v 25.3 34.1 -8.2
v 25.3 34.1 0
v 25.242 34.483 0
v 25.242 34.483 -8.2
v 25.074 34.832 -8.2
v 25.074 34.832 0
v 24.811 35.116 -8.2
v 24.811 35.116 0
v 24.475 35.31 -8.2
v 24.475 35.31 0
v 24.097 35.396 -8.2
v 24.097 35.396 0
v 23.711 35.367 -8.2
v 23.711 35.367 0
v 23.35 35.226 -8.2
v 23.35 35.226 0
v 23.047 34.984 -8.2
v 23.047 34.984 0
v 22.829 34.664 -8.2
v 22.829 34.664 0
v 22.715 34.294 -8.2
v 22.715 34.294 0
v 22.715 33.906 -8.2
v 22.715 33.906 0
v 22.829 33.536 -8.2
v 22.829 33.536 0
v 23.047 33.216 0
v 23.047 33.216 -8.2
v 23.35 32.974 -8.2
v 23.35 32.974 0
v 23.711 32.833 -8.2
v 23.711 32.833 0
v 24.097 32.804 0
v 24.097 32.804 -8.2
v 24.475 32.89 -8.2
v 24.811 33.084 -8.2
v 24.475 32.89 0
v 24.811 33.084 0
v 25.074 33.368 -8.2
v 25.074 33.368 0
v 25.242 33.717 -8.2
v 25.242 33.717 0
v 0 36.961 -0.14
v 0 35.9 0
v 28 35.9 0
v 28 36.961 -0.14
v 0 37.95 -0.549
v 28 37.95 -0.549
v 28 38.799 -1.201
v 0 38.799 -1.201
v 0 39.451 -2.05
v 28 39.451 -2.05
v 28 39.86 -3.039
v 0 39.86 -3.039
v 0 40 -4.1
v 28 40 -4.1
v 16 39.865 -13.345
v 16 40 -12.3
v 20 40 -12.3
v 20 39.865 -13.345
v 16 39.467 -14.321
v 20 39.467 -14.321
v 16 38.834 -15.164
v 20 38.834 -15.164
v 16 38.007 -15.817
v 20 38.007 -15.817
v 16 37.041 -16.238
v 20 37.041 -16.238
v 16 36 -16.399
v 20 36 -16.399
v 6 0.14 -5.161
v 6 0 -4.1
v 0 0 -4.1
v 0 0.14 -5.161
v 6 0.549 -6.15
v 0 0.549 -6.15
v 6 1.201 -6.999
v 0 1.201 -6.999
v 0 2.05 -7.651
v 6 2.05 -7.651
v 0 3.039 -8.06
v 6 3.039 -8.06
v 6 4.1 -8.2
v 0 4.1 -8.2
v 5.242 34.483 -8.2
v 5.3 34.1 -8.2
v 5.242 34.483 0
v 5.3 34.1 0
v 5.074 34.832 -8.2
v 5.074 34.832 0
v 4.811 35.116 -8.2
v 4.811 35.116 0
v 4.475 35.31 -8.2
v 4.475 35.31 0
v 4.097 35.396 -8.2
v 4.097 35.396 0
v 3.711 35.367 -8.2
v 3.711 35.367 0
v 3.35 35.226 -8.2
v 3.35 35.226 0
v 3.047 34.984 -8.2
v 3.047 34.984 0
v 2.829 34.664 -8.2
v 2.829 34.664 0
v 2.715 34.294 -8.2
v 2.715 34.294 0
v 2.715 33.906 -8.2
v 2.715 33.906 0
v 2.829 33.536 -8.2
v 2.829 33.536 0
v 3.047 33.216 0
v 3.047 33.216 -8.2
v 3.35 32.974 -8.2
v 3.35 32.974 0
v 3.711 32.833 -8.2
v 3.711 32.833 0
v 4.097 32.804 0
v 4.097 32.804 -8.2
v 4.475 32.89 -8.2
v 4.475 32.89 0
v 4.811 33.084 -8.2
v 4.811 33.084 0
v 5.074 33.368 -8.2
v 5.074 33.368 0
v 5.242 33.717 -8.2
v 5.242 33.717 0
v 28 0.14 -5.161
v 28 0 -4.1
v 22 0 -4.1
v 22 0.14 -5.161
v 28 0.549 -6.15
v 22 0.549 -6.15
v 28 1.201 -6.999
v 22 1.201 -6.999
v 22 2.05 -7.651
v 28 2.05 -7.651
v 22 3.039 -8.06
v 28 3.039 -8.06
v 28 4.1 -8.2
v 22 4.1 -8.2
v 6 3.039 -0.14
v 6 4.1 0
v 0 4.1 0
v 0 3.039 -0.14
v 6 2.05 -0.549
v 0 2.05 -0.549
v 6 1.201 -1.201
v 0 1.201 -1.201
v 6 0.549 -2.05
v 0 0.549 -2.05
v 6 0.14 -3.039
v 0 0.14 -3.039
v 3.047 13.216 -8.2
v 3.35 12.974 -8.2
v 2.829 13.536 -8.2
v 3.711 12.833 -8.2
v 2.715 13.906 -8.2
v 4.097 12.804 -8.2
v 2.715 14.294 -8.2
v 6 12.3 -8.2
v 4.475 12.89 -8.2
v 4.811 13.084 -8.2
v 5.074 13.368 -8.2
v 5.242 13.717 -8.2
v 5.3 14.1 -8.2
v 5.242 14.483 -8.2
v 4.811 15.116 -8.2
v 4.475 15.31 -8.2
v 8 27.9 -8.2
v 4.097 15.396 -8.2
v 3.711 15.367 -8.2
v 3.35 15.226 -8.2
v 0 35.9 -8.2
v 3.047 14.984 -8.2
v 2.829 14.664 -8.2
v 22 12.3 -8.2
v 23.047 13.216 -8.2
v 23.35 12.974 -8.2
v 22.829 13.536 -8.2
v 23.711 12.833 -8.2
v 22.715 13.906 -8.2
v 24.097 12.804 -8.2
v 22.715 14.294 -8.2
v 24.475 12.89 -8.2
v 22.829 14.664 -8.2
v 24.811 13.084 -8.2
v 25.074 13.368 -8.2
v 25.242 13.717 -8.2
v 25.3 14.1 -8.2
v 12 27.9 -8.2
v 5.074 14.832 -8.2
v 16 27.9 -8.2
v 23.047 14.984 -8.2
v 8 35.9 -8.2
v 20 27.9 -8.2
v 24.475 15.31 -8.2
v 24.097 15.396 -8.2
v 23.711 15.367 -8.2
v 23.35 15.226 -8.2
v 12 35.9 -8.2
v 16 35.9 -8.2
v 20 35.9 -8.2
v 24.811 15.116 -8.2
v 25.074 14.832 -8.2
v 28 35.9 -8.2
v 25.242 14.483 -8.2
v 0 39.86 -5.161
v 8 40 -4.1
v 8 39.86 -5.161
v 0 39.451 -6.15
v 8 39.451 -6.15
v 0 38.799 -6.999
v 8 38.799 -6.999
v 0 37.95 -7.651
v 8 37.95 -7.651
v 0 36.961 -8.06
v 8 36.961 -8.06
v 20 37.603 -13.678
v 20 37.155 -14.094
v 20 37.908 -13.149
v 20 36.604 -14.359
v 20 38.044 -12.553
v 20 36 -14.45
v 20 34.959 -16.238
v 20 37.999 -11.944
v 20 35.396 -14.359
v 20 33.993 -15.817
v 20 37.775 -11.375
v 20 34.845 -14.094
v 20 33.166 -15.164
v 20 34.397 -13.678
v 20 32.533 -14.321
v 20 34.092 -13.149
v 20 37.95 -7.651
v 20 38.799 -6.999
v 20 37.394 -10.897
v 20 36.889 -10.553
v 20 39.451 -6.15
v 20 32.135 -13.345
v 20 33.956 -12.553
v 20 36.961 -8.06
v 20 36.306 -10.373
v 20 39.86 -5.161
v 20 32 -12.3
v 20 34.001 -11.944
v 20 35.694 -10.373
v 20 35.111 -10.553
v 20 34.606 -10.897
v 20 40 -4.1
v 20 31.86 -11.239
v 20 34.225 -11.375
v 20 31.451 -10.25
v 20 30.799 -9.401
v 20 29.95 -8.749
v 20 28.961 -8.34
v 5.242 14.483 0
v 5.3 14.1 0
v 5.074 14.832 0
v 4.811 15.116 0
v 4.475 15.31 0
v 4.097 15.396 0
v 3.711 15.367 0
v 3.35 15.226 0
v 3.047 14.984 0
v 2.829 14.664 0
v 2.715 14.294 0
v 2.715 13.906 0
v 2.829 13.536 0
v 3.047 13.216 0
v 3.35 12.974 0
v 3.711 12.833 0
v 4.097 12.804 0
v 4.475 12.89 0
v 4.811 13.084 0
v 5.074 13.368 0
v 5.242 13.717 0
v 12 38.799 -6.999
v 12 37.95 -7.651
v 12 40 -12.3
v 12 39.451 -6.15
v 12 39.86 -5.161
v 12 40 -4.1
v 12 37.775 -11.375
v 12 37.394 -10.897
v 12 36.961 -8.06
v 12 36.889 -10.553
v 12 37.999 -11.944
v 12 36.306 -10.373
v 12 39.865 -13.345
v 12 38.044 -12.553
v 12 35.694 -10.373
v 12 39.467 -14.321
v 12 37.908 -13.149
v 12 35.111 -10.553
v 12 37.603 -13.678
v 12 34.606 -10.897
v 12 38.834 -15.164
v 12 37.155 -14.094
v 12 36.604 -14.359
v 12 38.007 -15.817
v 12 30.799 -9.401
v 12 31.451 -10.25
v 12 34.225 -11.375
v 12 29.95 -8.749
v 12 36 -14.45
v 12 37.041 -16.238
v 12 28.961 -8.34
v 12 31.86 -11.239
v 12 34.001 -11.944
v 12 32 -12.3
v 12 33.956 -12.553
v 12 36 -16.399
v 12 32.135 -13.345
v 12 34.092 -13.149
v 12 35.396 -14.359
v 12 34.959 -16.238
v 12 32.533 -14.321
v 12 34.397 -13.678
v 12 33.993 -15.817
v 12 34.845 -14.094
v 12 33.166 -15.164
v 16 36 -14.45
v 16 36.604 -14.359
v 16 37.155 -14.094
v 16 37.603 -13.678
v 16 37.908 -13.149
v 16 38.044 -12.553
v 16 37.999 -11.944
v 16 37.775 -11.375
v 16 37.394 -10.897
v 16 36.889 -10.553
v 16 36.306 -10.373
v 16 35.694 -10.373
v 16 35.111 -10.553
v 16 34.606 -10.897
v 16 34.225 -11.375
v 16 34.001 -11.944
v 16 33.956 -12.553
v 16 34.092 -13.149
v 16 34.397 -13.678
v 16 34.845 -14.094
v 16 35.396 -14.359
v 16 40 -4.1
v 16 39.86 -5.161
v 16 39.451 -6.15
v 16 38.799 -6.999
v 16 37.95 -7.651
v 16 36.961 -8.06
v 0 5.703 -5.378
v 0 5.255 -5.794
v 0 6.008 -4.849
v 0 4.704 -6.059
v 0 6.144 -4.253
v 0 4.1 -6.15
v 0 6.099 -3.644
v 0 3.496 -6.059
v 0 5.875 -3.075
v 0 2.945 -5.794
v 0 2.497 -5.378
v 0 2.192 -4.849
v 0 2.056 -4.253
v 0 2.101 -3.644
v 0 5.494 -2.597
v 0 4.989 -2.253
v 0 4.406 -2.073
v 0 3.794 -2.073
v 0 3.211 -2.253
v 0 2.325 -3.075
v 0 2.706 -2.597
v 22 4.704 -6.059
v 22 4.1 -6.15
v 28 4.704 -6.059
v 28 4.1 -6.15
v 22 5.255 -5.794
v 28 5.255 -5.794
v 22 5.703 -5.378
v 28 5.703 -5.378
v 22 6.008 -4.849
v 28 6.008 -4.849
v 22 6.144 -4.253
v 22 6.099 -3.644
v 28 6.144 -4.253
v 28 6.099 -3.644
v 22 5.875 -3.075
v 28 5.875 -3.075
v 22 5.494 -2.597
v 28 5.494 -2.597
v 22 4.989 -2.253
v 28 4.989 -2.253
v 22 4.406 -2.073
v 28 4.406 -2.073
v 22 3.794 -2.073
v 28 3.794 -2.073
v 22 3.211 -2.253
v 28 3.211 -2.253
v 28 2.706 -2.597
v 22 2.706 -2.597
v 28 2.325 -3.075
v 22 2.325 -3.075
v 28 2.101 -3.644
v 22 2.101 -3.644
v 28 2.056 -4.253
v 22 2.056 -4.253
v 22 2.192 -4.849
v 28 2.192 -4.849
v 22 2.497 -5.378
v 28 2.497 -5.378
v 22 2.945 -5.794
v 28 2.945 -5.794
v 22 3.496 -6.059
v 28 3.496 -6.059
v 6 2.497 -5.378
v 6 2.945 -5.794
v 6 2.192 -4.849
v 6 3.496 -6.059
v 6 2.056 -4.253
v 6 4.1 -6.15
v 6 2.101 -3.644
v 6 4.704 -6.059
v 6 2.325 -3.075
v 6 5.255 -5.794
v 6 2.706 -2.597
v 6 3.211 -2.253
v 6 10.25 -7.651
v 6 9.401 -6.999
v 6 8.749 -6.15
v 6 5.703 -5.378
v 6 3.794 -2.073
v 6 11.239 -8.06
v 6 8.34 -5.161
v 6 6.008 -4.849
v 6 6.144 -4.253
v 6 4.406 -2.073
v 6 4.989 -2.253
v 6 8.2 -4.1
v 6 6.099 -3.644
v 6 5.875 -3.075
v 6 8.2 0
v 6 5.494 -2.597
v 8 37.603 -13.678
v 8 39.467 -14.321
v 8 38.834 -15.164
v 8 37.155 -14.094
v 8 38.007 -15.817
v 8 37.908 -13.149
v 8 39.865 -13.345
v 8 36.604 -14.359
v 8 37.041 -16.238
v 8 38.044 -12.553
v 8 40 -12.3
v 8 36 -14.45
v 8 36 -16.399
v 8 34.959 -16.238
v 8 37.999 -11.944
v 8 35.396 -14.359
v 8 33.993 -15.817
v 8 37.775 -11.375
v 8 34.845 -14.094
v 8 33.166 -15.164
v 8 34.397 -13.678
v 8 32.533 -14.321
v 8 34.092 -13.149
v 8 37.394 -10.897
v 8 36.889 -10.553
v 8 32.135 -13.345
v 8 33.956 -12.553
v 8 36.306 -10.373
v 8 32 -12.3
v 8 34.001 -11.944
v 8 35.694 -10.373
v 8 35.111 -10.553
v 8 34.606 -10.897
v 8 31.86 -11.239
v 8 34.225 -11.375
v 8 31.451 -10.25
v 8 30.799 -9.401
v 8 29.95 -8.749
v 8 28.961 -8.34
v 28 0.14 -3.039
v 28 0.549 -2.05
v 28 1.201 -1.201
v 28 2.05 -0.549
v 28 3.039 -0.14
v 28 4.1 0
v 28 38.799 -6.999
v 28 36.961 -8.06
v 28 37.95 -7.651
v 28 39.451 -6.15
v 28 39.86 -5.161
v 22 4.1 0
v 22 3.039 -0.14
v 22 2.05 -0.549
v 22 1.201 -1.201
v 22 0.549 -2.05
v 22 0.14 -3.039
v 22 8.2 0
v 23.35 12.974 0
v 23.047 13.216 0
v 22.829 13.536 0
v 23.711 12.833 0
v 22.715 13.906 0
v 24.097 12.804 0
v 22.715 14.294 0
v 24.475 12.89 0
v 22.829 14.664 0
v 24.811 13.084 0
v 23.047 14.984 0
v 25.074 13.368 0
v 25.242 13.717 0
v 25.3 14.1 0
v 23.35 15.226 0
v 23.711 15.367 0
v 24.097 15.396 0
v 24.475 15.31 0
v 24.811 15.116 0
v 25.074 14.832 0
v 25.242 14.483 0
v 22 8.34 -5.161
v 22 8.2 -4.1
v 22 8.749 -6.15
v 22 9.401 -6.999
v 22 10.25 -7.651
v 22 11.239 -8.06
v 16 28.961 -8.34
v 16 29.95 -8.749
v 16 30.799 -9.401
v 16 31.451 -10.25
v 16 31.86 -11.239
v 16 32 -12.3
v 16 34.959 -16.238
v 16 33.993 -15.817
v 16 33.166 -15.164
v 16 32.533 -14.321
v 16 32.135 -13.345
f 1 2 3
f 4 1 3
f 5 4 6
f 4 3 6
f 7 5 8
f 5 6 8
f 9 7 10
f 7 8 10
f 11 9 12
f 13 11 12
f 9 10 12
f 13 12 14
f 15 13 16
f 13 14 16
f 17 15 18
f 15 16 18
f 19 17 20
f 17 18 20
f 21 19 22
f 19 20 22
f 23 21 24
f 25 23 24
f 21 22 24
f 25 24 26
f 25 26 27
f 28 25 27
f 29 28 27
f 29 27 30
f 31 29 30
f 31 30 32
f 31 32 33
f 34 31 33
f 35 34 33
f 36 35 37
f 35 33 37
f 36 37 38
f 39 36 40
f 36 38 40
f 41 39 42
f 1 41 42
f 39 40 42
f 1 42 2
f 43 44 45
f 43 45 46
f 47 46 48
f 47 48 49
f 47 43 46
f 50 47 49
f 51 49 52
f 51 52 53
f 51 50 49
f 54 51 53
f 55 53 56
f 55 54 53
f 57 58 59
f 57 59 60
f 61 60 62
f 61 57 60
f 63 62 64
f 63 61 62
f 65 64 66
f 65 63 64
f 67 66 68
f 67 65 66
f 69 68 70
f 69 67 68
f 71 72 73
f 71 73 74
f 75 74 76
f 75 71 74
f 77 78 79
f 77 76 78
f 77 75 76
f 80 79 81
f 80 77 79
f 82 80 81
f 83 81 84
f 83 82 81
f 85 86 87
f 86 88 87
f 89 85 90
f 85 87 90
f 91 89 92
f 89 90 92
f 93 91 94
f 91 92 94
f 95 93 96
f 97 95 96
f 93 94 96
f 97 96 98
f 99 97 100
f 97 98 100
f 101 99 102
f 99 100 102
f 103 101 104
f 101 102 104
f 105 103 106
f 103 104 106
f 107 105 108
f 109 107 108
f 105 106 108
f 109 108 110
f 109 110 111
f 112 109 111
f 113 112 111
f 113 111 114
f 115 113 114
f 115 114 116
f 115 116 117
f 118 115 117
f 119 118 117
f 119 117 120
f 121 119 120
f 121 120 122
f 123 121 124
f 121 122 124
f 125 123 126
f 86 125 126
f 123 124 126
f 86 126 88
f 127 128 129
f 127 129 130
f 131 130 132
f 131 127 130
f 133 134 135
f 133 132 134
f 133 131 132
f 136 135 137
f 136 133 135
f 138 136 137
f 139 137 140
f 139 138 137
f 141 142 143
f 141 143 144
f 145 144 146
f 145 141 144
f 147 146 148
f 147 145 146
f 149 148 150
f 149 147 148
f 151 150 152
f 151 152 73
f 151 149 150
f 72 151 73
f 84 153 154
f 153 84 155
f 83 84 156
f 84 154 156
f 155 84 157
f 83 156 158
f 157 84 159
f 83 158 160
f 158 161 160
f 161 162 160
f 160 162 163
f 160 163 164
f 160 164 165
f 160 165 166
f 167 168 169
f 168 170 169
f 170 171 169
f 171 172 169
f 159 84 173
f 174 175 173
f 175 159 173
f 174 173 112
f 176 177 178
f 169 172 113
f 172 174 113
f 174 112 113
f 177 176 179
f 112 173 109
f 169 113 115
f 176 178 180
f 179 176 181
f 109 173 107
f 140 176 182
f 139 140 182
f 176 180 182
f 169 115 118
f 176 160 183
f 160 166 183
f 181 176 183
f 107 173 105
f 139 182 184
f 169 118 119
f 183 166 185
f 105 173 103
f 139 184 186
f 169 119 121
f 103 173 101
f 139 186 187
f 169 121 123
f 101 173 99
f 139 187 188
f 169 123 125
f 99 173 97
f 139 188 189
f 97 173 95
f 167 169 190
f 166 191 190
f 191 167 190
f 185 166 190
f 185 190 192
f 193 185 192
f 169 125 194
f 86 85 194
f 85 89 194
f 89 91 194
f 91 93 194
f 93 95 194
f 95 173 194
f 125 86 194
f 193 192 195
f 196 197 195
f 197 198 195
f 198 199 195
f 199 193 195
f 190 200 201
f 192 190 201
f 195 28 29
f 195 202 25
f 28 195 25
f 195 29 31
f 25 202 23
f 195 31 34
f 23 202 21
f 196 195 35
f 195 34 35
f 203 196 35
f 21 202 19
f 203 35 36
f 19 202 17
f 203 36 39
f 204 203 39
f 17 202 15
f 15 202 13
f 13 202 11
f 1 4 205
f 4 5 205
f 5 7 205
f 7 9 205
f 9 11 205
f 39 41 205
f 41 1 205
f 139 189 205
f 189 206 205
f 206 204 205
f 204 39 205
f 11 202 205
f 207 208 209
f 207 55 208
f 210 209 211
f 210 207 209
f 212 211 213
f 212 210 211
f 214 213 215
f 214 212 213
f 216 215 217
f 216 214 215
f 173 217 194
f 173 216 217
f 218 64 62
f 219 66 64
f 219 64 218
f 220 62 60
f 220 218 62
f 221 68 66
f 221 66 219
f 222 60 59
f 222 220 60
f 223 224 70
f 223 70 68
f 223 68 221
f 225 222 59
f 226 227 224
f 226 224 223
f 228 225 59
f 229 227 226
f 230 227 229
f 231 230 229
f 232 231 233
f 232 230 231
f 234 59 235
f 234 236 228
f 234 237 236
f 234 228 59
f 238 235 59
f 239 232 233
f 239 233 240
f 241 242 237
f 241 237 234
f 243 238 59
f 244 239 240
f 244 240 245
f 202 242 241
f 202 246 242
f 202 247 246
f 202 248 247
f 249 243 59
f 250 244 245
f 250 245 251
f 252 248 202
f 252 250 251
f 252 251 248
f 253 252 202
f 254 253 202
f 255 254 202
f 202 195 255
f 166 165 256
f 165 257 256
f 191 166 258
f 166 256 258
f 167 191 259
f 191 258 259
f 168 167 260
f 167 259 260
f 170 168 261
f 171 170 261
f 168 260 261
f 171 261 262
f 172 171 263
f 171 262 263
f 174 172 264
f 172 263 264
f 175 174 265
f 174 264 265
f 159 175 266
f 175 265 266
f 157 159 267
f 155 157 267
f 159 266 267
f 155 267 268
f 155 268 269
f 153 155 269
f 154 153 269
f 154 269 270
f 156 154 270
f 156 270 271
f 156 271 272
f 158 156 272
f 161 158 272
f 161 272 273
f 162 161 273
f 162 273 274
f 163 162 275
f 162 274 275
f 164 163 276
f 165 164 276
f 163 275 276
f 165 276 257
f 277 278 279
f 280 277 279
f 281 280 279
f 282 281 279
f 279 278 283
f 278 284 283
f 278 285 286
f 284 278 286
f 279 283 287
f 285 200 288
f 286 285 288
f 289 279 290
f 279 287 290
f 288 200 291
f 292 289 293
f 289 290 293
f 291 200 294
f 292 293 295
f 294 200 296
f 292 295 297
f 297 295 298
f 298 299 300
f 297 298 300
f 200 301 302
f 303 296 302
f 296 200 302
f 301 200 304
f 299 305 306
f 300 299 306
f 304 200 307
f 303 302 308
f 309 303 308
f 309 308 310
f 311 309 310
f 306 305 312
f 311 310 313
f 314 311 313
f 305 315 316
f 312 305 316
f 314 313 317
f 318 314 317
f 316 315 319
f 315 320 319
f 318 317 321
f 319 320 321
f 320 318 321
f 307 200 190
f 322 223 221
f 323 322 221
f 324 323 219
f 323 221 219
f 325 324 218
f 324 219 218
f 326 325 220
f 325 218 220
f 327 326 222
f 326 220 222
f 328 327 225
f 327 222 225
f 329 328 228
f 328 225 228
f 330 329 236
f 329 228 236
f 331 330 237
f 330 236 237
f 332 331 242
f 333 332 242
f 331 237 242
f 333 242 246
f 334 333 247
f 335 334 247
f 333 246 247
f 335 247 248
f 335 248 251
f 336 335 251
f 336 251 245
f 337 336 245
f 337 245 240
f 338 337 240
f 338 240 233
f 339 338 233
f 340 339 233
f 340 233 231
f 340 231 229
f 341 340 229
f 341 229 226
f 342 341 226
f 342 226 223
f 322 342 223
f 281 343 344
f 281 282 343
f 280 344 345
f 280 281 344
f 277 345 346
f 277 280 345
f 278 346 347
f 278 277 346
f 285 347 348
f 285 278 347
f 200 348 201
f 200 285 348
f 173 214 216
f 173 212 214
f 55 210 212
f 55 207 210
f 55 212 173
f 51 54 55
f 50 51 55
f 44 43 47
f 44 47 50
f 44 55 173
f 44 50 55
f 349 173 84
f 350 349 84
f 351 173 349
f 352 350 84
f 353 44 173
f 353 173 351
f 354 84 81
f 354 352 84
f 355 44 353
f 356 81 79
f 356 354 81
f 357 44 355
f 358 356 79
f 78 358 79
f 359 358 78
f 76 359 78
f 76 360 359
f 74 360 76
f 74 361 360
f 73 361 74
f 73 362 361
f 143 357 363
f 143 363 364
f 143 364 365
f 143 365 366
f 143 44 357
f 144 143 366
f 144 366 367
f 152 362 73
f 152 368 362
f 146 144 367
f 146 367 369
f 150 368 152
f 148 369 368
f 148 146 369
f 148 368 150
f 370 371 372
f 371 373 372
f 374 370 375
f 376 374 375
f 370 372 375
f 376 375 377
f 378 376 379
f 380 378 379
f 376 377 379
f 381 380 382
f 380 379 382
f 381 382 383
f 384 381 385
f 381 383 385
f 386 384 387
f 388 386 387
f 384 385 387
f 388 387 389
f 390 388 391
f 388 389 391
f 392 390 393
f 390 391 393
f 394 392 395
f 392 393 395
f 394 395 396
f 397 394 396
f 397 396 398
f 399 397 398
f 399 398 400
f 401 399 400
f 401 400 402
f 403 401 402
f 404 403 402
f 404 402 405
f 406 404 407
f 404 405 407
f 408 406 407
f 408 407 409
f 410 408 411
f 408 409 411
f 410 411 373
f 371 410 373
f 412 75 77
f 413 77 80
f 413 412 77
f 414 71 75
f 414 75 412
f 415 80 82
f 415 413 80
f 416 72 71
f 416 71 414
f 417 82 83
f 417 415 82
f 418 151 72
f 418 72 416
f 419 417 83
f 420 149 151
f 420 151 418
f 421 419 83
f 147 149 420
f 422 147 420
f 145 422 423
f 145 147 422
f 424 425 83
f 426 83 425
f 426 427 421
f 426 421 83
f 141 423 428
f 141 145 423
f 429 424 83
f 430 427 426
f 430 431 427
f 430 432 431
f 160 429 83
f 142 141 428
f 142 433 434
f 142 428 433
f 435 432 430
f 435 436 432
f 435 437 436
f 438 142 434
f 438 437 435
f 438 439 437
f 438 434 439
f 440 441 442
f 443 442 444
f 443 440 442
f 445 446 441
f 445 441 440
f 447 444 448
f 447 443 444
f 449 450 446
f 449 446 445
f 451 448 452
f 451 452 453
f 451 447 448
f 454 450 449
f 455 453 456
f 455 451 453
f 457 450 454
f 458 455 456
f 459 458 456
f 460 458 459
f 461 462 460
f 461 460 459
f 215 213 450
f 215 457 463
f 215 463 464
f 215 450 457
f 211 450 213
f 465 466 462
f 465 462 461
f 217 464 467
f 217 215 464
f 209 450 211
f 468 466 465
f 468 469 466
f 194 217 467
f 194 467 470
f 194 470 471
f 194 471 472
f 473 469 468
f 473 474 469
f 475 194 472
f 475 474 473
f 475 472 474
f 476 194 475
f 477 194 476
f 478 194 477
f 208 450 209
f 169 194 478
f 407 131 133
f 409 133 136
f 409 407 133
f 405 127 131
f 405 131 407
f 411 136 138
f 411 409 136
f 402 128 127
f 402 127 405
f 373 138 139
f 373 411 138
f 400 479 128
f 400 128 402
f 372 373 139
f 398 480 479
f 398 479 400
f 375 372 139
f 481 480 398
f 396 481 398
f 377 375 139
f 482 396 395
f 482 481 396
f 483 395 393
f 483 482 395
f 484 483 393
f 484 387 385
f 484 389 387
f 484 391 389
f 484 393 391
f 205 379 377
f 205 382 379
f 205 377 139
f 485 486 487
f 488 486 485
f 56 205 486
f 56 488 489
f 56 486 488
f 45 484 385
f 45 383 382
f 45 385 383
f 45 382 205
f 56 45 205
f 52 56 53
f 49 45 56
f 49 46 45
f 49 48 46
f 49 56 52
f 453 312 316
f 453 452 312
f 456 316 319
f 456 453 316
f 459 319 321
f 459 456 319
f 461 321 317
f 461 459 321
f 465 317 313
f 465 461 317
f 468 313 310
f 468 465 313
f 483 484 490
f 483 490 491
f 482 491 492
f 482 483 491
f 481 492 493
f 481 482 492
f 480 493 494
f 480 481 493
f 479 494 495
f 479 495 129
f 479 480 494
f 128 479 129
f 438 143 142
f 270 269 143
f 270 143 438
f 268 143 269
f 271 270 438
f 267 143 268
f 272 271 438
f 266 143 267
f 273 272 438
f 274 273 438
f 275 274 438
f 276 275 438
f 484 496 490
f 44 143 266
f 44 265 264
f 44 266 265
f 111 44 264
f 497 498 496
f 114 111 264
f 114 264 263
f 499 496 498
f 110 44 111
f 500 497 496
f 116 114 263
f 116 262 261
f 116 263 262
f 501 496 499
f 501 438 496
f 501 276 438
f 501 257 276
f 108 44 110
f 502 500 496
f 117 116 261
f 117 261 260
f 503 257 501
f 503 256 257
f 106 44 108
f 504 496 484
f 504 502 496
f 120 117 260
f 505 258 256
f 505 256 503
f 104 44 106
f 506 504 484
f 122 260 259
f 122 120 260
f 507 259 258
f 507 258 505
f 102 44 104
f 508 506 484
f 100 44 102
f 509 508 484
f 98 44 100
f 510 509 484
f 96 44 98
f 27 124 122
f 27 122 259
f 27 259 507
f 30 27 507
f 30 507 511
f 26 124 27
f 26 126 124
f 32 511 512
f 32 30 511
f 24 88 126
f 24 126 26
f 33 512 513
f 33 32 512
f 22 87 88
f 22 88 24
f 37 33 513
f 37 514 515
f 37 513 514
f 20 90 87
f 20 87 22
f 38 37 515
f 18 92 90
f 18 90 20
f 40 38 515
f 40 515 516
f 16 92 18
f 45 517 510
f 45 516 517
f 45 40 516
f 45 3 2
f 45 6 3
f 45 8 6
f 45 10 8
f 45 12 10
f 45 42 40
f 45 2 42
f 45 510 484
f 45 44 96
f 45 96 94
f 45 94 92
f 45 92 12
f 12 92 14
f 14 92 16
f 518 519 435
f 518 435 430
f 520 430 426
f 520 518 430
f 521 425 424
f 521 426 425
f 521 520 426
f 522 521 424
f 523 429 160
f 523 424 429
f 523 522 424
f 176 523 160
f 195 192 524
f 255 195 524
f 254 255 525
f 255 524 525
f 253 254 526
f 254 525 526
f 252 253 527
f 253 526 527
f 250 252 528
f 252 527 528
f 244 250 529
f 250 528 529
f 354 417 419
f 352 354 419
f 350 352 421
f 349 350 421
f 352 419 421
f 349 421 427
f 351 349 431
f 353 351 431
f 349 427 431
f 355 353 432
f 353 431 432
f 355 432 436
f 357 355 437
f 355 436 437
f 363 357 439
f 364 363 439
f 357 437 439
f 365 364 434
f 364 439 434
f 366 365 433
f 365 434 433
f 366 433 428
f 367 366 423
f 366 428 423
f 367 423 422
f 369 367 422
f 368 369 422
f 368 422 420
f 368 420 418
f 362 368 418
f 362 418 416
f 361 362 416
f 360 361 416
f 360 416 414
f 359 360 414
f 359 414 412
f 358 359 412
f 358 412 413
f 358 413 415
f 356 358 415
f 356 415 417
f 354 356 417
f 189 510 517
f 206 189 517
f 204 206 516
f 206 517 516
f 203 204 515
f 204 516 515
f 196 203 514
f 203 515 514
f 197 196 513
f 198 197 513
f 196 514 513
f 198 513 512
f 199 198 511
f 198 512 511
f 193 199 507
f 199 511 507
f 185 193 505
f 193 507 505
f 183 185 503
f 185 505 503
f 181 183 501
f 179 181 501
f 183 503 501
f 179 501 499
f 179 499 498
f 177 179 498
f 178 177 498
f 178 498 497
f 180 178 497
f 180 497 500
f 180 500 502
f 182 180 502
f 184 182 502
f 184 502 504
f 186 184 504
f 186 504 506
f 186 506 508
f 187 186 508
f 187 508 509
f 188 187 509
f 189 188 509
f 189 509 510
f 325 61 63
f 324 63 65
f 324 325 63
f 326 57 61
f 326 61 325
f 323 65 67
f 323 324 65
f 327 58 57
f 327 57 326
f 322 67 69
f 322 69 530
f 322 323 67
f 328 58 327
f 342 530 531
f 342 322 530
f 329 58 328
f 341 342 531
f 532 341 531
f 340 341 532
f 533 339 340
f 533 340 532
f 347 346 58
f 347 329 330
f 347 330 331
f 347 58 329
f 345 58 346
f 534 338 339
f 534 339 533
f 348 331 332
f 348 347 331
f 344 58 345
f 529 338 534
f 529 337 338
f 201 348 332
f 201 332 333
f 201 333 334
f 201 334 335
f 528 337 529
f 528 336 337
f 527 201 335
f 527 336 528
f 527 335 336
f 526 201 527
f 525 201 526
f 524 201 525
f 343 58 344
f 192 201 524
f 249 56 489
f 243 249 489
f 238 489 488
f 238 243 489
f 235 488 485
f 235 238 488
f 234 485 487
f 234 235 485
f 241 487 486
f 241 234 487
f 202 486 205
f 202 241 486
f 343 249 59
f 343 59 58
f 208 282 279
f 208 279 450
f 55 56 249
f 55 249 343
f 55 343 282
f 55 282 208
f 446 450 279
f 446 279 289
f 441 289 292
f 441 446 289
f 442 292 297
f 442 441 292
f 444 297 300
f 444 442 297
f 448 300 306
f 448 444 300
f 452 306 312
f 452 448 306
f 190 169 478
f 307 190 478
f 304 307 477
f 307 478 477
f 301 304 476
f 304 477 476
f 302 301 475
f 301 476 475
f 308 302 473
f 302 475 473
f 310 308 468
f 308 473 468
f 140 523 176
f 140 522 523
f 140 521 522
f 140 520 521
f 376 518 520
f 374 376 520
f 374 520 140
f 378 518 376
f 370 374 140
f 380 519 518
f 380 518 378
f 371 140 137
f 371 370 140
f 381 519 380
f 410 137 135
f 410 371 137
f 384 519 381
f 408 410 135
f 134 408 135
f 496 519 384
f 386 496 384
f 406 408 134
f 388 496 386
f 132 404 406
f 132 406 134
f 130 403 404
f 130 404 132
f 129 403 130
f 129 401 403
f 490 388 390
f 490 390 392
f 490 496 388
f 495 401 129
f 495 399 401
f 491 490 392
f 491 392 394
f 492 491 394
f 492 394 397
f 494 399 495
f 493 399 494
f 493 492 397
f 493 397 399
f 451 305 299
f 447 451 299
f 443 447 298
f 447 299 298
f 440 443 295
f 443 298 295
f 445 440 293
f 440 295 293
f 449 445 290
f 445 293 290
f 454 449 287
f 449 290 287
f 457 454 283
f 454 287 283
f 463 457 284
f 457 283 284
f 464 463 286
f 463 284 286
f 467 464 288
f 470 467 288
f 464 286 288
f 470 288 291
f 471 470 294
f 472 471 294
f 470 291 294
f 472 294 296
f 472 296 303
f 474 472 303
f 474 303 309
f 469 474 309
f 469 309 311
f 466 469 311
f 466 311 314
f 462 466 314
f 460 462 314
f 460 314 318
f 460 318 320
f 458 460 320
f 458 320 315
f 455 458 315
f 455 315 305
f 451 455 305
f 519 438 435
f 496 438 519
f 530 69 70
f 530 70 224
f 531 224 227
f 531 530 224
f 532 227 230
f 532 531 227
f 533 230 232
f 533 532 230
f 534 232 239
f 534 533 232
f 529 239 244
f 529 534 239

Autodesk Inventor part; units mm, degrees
ref_plane "YZ Plane" through (0, 0, 0) normal (1, 0, 0) x (0, 1, 0)
ref_plane "XZ Plane" through (0, 0, 0) normal (0, 1, 0) x (-1, 0, 0)
ref_plane "XY Plane" through (0, 0, 0) normal (0, 0, 1) x (1, 0, 0)
sketch "Sketch1" plane through (0, 0, 0) normal (0, 0, 1) x (1, 0, 0)
  line L0 (0, 40) -> (0, 0)
  line L1 (0, 0) -> (6, 0)
  line L2 (6, 0) -> (6, 8.2)
  line L3 (6, 8.2) -> (22, 8.2)
  line L4 (22, 8.2) -> (22, 0)
  line L5 (22, 0) -> (28, 0)
  line L6 (28, 0) -> (28, 40)
  line L7 (28, 40) -> (0, 40)
  dimension "d0" = 6
  dimension "d1" = 6
  dimension "d2" = 16
  dimension "d3" = 40
  dimension "d4" = 8.2
extrude "Extrusion1" add sketch "Sketch1" against normal blind 8.2
sketch "Sketch2" plane through (28, 0, 0) normal (1, 0, 0) x (0, 0, -1)
  circle A0 centre (4.1, 4.1) radius 2.05
  line L0 (0, 0) -> (8.2, 0) projected
  line L1 (0, 0) -> (8.2, 0) projected
  point P0 (4.1, 0)
  dimension "d7" = 4.1
  dimension "d8" = 4.1
  dimension "d9" = 8.2
extrude "Extrusion2" cut sketch "Sketch2" against normal through all
fillet "Fillet1" radius 4.1 5 edges at (25, 0, 0) (3, 0, 0) (3, 0, -8.2) (25, 0, -8.2) (14, 8.2, -8.2)
sketch "Sketch3" plane through (0, 0, -8.2) normal (0, 0, -1) x (-1, 0, 0)
  line L0 (0, 40) -> (-28, 40) projected
  line L1 (-20, 40) -> (-16, 40)
  line L2 (-16, 40) -> (-16, 32)
  line L3 (-16, 32) -> (-20, 32)
  line L4 (-20, 32) -> (-20, 40)
  line L5 (-12, 40) -> (-8, 40)
  line L6 (-8, 40) -> (-8, 32)
  line L7 (-8, 32) -> (-12, 32)
  line L8 (-12, 32) -> (-12, 40)
  point P0 (0, 0)
  point P1 (-14, 40)
  dimension "d13" = 4
  dimension "d14" = 4
  dimension "d15" = 4
  dimension "d16" = 2
  dimension "d17" = 8
extrude "Extrusion3" add sketch "Sketch3" along normal blind 8.2
sketch "Sketch4" plane through (20, 32, -8.2) normal (1, 0, 0) x (0, 0, -1)
  circle A0 centre (4.2, 4) radius 2.05
  line L0 (8.2, 8) -> (8.2, 0) projected
  point P0 (-8.2, -32)
  dimension "d20" = 4.1
  dimension "d21" = 8
  dimension "d22" = 4
  dimension "d23" = 4
extrude "Extrusion4" cut sketch "Sketch4" against normal through all
fillet "Fillet2" radius 4.1 6 edges at (10, 40, -16.4) (18, 40, -16.4) (18, 32, -16.4) (10, 32, -16.4) (18, 32, -8.2) (10, 32, -8.2)
fillet "Fillet3" radius 4.1 4 edges at (14, 40, 0) (4, 40, -8.2) (14, 40, -8.2) (24, 40, -8.2)
sketch "Sketch5" plane through (0, 0, 0) normal (0, 0, 1) x (1, 0, 0)
  circle A0 centre (4, 34.1) radius 1.3
  line L0 (0, 35.9) -> (28, 35.9) construction
  line L1 (0, 35.9) -> (0, 4.1) construction
  circle A1 centre (4, 14.1) radius 1.3
  circle A2 centre (24, 34.1) radius 1.3
  circle A3 centre (24, 14.1) radius 1.3
  line L2 (28, 4.1) -> (28, 35.9) construction
  line L3 (6, 12.3) -> (22, 12.3) construction
  point P0 (0, 0)
  point P1 (14, 35.9)
  dimension "d30" = 20
  dimension "d33" = 20
  dimension "d36" = 1.8
  dimension "d37" = 10
  dimension "d38" = 2.6
  dimension "d42" = 23.6
extrude "Extrusion5" cut sketch "Sketch5" against normal up to surface (8.2 mm away)
equation "\"d0\" = d1"
equation "\"d4\" = 2 * arm_rod_diam"
equation "\"d5\" = 2 * arm_rod_diam"
equation "\"d7\" = arm_rod_diam"
equation "\"d8\" = 0.5 * d9"
equation "\"d12\" = arm_rod_diam"
equation "\"d13\" = d14"
equation "\"d16\" = 0.5 * d15"
equation "\"d18\" = 2 * arm_rod_diam"
equation "\"d20\" = arm_rod_diam"
equation "\"d22\" = 0.5 * d21"
equation "\"d23\" = d22"
equation "\"d26\" = arm_rod_diam"
equation "\"d27\" = arm_rod_diam"
equation "\"d36\" = -0.5 * d30 + 0.5 * d42"
equation "\"d37\" = 0.5 * d33"
equation "\"arm_rod_diam\" = 4.1"
properties part number "camera_arm" material "ABS Plastic"
